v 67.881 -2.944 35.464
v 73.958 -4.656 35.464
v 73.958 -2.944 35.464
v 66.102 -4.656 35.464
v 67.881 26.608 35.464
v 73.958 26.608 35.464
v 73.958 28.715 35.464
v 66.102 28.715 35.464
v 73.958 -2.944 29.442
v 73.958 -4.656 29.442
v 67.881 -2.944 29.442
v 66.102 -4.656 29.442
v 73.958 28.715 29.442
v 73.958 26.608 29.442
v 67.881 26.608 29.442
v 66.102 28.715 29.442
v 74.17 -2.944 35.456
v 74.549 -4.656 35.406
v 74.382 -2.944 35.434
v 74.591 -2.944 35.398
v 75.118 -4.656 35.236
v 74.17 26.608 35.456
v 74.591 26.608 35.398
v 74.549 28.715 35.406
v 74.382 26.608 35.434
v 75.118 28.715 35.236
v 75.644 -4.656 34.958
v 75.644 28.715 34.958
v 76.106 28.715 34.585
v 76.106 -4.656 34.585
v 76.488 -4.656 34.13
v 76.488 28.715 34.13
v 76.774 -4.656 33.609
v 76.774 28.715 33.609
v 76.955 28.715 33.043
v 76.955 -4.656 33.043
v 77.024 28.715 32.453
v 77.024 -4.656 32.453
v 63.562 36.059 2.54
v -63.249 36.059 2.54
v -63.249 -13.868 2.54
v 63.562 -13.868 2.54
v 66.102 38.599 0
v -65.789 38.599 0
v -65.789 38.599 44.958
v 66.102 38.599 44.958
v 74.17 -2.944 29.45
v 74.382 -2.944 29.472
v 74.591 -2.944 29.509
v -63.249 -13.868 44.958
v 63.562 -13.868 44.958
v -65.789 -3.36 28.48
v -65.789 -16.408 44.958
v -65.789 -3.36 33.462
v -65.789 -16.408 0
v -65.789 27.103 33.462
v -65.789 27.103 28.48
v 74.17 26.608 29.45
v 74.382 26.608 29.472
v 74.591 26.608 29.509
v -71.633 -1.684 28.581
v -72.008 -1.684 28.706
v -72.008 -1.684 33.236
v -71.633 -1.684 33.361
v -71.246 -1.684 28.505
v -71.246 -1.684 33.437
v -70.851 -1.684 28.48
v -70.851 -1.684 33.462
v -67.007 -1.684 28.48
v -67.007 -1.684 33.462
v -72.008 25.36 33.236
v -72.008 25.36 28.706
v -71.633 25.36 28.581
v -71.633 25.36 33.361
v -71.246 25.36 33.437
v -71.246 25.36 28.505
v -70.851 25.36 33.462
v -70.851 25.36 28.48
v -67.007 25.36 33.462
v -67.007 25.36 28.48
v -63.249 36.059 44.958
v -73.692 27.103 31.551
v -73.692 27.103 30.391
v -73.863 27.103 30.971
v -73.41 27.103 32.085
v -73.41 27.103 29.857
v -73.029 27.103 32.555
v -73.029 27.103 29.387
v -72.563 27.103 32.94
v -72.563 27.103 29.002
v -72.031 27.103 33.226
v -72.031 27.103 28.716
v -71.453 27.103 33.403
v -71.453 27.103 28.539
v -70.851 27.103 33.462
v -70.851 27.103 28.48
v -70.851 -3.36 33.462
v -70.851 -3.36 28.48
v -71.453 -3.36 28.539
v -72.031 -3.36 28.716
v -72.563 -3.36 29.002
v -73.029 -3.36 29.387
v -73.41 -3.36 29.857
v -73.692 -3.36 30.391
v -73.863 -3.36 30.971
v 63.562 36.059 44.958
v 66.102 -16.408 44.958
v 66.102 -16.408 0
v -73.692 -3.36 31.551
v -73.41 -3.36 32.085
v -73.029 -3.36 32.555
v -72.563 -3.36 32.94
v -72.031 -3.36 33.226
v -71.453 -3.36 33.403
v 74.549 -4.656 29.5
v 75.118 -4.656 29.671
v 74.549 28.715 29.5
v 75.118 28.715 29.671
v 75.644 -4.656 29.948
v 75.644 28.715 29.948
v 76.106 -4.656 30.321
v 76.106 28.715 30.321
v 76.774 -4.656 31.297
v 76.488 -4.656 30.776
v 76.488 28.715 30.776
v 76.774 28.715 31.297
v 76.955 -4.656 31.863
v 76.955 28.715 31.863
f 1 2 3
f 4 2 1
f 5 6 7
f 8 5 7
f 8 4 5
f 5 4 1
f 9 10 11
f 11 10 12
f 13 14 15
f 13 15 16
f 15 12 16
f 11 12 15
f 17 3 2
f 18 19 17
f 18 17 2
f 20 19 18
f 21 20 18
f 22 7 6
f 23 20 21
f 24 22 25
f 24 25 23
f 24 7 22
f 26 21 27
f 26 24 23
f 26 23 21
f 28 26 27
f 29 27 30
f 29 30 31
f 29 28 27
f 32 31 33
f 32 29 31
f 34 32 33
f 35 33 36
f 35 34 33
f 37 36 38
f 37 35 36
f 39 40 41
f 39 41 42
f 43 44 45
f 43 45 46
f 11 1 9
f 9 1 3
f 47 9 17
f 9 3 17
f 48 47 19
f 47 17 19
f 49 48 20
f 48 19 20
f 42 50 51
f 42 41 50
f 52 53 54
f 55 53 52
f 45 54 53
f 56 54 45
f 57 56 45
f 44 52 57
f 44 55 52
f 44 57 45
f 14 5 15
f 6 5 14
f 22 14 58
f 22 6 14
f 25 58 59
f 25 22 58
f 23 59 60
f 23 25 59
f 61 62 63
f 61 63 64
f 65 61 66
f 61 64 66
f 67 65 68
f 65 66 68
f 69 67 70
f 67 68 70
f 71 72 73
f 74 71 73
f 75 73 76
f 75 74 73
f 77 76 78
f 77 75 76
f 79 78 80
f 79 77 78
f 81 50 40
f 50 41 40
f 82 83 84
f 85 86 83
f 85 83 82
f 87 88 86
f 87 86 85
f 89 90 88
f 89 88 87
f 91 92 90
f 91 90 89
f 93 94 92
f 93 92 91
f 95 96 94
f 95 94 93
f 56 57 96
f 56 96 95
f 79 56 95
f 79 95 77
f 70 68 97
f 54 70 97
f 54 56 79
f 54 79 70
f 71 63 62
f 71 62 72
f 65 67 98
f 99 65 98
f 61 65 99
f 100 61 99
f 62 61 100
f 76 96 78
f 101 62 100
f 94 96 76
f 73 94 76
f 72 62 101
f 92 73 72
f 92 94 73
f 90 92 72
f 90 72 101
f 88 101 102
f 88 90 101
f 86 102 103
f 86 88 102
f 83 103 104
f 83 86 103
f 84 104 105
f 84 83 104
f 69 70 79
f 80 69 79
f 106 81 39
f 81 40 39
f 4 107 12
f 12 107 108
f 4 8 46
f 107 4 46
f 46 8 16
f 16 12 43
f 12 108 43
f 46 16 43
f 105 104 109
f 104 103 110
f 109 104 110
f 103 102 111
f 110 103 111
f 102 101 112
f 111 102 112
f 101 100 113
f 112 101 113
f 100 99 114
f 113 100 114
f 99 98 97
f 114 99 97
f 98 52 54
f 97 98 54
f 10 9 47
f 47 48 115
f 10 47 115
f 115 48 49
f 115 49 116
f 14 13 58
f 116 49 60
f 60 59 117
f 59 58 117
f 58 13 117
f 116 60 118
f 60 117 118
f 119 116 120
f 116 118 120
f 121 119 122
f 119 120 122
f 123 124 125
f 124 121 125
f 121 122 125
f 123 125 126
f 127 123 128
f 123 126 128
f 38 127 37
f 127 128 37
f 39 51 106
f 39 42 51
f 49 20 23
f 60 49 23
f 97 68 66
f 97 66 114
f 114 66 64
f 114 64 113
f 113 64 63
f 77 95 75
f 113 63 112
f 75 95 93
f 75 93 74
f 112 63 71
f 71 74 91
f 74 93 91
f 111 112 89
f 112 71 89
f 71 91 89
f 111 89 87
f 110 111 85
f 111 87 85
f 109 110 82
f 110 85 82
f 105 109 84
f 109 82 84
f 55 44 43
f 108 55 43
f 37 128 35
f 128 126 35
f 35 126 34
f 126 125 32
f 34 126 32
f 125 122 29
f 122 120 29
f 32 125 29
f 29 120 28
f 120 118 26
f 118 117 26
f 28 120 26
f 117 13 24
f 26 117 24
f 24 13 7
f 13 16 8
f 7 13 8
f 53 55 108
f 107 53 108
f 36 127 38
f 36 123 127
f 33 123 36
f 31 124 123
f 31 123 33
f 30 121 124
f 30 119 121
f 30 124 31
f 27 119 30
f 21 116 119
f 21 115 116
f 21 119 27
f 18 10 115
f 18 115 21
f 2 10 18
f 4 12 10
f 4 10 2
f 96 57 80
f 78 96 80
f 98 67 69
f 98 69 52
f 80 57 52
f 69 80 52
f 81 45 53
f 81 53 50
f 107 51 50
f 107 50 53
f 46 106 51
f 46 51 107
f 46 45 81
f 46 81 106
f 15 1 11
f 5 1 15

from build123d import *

# Parameters (mm, degrees)
F0_W         = 131.8914890289
F0_H         = 55.0068765879
F1_DEPTH     = 44.958
F2_T         = -2.54
F3_W         = 33.3715188317
F3_H         = 6.021162495
F4_DEPTH     = 10.922
F5_W         = 6.7100599408
F5_H         = 29.552442953
F6_DEPTH     = 25.4
F7_T1_DEPTH  = 48.7017749528
F8_W         = 30.4629029706
F8_H         = 4.9823708832
F9_DEPTH     = 8.128
F10_W        = 5.0006210804
F10_H        = 27.0441961475
F11_DEPTH    = 25.4
F12_T1_DEPTH = 45.7931590917


# Not quite as in the source:
# - a fillet or chamfer that OpenCascade refuses, or shapes differently, is made with other operations: its cross-section is extruded or revolved along the edge and cut away or added


with BuildPart() as f1:
    # F0 (on Top) → F1 (new body)
    with BuildSketch(Plane.XY):
        with Locations((0.1562684774, 11.095136404)):
            Rectangle(F0_W, F0_H)
    extrude(amount=F1_DEPTH)

    # F2
    f2_openings = [f1.faces().sort_by_distance(p)[0] for p in [
        (0.156268, 11.095136, 44.958),
    ]]
    offset(amount=F2_T, openings=f2_openings)

    # F3 (on face) → F4 (join)
    with BuildSketch(Plane.YZ.offset(66.1020129919)):
        with Locations((12.0295642409, 32.4530350044)):
            Rectangle(F3_W, F3_H)
    extrude(amount=F4_DEPTH)

    # F5 (on face) → F6 (cut)
    with BuildSketch(Plane.XY.offset(35.4636162519)):
        with Locations((71.2361820042, 11.8320556358)):
            Rectangle(F5_W, F5_H)
    extrude(amount=-F6_DEPTH, mode=Mode.SUBTRACT)

    # F7: fillet of radius 3.0660512242 on 2 edges, made by hand

    # F7_s2 → F7_t1 (cut)
    with BuildSketch(Plane.XZ.offset(-36.3804517173)):
        with BuildLine():
            ThreePointArc((73.9579617677, 35.4636162519), (76.1259873798, 34.5655906398), (77.0240129919, 32.3975650277))
            Line((77.0240129919, 32.3975650277), (77.0240129919, 35.4636162519))
            Line((77.0240129919, 35.4636162519), (73.9579617677, 35.4636162519))
        make_face()
        with BuildLine():
            ThreePointArc((73.9579617677, 29.4424537569), (76.1259873798, 30.340479369), (77.0240129919, 32.5085049811))
            Line((77.0240129919, 32.5085049811), (77.0240129919, 29.4424537569))
            Line((77.0240129919, 29.4424537569), (73.9579617677, 29.4424537569))
        make_face()
    extrude(amount=F7_T1_DEPTH, mode=Mode.SUBTRACT)

    # F8 (on face) → F9 (join)
    with BuildSketch(Plane(origin=(-65.789476037, 0, 0), x_dir=(0, -1, 0), z_dir=(-1, 0, 0))):
        with Locations((-11.8714510463, 30.9710260481)):
            Rectangle(F8_W, F8_H)
    extrude(amount=F9_DEPTH)

    # F10 (on face) → F11 (cut)
    with BuildSketch(Plane.XY.offset(33.4622114897)):
        with Locations((-69.5076957345, 11.8382142391)):
            Rectangle(F10_W, F10_H)
    extrude(amount=-F11_DEPTH, mode=Mode.SUBTRACT)

    # F12: fillet of radius 3.0660512242 on 2 edges, made by hand

    # F12_s2 → F12_t1 (cut)
    with BuildSketch(Plane.XZ.offset(-34.7680305922)):
        with BuildLine():
            ThreePointArc((-70.8514248128, 33.4622114897), (-73.0194504249, 32.5641858776), (-73.917476037, 30.3961602655))
            Line((-73.917476037, 30.3961602655), (-73.917476037, 33.4622114897))
            Line((-73.917476037, 33.4622114897), (-70.8514248128, 33.4622114897))
        make_face()
        with BuildLine():
            ThreePointArc((-70.8514248128, 28.4798406065), (-73.0194504249, 29.3778662186), (-73.917476037, 31.5458918307))
            Line((-73.917476037, 31.5458918307), (-73.917476037, 28.4798406065))
            Line((-73.917476037, 28.4798406065), (-70.8514248128, 28.4798406065))
        make_face()
    extrude(amount=F12_T1_DEPTH, mode=Mode.SUBTRACT)


solid = f1.part
